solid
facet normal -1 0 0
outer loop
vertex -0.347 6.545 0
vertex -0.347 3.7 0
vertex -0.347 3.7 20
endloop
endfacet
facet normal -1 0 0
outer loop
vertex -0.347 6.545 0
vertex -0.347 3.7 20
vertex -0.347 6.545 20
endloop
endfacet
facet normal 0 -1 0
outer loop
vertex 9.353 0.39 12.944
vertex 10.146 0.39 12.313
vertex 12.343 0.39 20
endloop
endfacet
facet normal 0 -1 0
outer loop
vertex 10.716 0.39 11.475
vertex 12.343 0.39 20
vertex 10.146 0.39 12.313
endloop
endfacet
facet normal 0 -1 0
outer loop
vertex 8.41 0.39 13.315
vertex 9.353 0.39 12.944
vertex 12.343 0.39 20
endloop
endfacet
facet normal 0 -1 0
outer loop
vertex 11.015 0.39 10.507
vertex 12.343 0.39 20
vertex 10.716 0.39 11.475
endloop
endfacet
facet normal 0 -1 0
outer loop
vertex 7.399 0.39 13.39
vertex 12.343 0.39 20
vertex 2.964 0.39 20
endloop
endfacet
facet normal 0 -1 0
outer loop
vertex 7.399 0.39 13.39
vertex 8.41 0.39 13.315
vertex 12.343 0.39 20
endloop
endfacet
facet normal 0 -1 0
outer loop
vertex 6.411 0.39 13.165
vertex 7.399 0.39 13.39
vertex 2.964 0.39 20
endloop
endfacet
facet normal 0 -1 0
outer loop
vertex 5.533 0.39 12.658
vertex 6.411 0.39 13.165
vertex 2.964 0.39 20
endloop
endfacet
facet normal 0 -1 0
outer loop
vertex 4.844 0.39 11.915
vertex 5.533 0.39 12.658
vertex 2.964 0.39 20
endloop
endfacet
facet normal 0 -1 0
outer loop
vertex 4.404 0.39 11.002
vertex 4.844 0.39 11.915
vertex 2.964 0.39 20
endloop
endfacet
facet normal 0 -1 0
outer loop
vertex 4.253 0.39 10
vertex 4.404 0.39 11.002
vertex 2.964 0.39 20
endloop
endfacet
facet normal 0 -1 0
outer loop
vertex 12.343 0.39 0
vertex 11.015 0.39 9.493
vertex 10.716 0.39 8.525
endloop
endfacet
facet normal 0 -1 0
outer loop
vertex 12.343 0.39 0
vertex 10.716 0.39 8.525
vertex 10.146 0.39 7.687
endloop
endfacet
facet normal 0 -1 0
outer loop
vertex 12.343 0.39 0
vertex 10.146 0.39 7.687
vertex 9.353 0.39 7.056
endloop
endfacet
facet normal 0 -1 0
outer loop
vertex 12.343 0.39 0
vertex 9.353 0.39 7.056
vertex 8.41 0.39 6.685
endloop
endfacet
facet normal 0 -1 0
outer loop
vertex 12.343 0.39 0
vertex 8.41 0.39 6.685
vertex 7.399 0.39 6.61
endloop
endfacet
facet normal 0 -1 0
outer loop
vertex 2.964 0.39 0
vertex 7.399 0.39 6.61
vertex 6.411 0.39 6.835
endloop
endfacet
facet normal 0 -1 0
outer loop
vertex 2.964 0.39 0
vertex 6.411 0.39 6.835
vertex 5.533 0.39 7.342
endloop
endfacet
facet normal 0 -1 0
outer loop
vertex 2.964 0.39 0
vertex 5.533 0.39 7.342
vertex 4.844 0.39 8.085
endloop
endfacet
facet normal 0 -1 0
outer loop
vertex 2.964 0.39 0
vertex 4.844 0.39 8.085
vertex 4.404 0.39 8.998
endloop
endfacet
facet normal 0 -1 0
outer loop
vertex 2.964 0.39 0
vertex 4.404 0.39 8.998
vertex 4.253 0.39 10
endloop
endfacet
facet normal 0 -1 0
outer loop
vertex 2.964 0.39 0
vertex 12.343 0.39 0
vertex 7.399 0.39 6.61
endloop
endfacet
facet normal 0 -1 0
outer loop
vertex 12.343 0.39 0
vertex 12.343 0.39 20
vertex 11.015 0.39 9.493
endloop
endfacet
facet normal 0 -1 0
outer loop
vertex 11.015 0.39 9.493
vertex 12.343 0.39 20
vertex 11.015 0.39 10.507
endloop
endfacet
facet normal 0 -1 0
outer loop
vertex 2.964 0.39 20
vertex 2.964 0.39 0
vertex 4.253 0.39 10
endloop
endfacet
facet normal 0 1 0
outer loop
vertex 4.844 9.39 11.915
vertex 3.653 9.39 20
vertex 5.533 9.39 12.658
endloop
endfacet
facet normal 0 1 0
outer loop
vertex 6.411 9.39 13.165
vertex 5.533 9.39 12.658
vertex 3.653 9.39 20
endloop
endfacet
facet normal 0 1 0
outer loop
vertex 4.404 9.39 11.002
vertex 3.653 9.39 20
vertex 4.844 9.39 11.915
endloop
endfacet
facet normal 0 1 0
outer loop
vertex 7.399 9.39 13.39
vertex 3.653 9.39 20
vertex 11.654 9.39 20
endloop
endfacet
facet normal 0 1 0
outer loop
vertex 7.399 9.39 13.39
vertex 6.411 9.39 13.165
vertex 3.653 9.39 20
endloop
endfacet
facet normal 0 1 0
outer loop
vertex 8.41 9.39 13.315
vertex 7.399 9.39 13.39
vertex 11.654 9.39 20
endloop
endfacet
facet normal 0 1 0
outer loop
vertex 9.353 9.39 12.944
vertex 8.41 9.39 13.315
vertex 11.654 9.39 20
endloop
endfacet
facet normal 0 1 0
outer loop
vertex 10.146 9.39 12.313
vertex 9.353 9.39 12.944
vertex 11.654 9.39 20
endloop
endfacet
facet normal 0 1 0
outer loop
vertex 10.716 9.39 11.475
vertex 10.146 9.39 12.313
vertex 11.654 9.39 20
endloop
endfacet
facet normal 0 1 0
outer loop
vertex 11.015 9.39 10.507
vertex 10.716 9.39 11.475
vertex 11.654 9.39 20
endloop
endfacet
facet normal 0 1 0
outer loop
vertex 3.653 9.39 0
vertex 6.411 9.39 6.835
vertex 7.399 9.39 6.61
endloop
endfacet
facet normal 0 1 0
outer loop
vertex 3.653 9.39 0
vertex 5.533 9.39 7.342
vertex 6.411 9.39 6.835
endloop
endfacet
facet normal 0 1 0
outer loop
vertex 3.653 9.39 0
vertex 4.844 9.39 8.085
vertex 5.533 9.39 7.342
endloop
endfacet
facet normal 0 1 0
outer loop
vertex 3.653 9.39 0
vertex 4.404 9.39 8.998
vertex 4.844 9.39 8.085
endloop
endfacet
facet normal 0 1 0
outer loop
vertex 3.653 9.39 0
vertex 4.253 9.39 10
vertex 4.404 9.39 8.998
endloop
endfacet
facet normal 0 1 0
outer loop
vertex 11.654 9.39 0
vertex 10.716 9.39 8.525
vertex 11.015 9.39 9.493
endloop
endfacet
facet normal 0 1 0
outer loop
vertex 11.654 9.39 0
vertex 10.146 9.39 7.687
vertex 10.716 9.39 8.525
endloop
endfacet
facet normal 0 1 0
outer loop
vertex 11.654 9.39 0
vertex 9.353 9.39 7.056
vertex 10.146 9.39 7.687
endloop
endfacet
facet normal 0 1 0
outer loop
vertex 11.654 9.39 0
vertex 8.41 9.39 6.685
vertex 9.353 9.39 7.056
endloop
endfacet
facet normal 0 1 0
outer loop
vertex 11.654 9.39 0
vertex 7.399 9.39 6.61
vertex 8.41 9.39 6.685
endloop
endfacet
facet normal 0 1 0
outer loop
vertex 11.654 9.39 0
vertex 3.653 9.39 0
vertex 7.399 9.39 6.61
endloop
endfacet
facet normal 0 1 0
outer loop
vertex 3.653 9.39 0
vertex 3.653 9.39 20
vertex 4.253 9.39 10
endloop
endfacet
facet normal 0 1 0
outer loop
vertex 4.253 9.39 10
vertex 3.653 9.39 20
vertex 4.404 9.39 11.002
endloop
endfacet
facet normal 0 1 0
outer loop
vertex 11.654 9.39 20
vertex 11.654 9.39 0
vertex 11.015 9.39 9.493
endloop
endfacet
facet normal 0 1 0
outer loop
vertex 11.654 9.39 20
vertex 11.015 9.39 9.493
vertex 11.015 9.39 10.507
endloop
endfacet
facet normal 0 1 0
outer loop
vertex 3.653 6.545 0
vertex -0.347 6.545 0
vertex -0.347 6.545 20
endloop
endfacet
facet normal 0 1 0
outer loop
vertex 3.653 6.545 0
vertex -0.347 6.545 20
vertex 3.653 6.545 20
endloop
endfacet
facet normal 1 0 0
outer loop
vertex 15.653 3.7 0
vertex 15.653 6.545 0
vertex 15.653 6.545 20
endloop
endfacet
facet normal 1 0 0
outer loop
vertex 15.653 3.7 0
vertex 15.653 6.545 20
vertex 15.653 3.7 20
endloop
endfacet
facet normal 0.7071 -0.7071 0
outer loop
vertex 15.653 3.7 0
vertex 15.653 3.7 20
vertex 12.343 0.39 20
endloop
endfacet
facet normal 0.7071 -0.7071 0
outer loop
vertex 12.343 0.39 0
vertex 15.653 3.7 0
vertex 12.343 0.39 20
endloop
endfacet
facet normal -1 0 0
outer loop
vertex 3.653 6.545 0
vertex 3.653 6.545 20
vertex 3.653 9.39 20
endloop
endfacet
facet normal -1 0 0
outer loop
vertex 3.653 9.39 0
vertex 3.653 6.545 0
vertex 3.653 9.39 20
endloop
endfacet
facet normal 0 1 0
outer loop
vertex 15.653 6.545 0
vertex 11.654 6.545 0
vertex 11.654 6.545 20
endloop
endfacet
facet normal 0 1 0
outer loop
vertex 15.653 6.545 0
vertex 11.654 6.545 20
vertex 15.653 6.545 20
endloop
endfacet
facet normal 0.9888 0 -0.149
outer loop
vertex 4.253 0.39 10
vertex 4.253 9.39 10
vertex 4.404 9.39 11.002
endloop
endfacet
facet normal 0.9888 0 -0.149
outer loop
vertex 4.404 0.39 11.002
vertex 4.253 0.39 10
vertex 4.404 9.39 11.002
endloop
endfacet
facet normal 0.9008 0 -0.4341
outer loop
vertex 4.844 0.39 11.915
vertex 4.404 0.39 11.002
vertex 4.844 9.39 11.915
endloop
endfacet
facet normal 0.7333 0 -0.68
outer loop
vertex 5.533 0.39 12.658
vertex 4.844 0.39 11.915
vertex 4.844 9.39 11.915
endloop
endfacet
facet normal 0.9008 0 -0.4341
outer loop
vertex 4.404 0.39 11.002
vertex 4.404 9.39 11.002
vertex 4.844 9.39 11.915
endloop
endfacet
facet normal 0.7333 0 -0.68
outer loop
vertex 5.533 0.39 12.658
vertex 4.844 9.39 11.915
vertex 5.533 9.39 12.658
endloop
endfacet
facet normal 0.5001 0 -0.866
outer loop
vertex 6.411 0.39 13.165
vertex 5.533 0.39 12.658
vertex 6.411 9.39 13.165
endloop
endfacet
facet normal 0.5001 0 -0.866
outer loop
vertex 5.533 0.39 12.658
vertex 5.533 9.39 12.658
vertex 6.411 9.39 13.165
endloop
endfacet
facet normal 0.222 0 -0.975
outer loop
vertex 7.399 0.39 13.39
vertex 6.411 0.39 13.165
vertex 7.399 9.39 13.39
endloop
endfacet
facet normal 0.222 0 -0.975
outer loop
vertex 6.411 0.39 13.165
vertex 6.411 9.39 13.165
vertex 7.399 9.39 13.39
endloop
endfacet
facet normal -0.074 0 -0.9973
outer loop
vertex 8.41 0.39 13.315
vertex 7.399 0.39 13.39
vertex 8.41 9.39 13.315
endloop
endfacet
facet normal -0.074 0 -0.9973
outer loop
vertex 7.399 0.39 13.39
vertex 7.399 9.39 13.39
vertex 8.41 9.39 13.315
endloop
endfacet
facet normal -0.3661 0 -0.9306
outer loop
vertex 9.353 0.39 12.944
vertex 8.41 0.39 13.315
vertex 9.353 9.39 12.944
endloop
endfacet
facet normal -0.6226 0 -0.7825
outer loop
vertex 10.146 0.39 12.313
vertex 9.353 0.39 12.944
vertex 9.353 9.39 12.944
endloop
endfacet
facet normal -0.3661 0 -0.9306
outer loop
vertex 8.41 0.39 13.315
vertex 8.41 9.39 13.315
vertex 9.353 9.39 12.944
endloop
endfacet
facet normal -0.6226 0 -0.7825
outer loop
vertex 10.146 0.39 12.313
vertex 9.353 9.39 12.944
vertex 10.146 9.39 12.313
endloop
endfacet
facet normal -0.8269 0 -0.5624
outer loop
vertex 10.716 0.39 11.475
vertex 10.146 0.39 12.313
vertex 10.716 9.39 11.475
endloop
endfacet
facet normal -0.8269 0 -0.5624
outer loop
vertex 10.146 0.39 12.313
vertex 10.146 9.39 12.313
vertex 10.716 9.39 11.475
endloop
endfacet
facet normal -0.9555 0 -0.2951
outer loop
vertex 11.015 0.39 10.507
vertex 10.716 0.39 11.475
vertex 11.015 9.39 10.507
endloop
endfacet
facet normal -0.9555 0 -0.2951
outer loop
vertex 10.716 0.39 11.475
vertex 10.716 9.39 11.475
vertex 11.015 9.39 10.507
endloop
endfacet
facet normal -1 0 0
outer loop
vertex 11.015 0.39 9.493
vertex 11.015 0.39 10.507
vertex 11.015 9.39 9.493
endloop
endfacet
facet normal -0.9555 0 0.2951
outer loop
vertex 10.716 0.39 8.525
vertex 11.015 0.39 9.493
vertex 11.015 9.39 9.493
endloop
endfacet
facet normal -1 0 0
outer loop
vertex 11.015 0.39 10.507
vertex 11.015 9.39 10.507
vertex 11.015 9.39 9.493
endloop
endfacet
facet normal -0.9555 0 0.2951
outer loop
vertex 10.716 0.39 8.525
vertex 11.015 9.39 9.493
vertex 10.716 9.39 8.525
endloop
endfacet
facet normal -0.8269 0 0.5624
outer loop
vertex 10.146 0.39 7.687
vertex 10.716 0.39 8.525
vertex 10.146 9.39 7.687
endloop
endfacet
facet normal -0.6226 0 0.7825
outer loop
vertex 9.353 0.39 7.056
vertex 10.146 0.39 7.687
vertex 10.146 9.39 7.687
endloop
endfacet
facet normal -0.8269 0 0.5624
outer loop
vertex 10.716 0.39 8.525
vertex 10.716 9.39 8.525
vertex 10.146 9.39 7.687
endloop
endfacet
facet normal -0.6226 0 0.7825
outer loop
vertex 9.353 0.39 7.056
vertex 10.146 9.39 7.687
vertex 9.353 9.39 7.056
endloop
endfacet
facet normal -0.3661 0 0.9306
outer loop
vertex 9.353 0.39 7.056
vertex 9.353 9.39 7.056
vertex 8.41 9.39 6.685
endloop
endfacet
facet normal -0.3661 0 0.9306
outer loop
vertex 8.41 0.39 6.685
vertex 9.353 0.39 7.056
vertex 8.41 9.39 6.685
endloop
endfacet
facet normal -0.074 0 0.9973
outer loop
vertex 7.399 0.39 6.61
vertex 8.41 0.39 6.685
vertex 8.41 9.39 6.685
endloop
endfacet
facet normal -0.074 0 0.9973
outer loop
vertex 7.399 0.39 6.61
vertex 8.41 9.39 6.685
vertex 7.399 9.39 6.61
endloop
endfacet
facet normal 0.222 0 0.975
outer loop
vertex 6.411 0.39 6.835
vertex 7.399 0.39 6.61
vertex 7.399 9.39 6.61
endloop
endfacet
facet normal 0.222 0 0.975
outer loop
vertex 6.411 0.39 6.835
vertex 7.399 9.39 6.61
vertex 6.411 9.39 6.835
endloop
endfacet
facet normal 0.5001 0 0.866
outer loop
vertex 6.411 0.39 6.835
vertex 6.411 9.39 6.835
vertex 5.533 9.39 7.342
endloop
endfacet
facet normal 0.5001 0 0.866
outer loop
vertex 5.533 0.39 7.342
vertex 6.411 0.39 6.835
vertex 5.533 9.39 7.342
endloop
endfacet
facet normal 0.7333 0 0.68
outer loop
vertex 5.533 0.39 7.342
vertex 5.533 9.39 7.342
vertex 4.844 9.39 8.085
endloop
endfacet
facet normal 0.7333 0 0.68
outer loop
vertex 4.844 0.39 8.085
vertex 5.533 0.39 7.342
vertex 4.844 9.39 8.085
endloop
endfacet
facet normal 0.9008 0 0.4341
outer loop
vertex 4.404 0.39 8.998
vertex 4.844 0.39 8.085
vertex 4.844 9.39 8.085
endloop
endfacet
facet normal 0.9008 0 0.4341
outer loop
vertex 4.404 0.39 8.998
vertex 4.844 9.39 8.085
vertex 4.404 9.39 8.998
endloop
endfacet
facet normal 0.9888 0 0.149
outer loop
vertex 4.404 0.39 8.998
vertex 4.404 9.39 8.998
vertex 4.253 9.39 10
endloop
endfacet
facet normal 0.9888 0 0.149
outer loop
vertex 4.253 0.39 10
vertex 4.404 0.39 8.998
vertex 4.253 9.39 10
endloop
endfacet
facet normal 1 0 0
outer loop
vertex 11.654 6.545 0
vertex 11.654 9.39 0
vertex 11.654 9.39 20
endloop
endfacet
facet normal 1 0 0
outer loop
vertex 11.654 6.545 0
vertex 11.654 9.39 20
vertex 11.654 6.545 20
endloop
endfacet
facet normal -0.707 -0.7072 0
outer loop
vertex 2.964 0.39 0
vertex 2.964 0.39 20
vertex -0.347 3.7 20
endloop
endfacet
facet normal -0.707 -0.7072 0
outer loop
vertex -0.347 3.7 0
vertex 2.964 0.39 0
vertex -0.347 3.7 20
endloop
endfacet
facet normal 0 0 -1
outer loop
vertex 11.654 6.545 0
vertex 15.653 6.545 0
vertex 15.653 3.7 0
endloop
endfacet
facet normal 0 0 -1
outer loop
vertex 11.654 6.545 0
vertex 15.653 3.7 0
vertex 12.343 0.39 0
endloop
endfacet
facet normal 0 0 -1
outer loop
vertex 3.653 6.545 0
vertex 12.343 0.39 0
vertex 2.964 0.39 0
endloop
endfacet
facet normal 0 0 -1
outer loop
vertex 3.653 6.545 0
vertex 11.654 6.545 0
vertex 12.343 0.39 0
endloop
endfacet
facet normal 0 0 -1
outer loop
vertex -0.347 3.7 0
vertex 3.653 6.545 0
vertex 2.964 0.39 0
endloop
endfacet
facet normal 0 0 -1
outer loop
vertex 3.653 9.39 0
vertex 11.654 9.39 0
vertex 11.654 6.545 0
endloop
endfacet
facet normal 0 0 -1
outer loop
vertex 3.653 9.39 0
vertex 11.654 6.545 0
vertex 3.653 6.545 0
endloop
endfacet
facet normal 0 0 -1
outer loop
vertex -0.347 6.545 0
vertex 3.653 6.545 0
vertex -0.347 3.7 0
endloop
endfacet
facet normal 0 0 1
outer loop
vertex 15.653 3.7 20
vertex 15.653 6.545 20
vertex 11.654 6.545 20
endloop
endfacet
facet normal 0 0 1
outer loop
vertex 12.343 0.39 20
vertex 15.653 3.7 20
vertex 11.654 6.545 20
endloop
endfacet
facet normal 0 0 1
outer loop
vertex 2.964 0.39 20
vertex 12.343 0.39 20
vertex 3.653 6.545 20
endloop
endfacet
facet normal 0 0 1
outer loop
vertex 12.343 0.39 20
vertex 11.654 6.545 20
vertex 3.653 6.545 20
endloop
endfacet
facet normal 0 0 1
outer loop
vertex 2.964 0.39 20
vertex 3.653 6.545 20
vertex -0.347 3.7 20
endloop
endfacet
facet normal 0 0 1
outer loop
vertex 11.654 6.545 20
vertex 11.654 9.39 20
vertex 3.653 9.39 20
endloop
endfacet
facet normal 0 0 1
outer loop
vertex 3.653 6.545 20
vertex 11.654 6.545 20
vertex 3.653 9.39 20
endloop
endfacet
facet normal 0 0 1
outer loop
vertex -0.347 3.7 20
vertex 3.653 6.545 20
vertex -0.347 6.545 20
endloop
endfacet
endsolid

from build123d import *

# Parameters (mm, degrees)
EXTRUSION1_DEPTH = 20
HOLE2_D          = 6.8


with BuildPart() as part:
    # Sketch1 → Extrusion1 (new body)
    with BuildSketch(Plane.XY):
        Polygon((2.963546137, 0.389938146), (-0.346853863, 3.700338146), (-0.346853863, 6.545138146), (3.652646137, 6.545138146), (3.652646137, 9.389938146), (11.653646137, 9.389938146), (11.653646137, 6.545138146), (15.653146137, 6.545138146), (15.653146137, 3.700338146), (12.342746137, 0.389938146), align=None)
    extrude(amount=EXTRUSION1_DEPTH)

    # Hole2 (through all)
    with Locations(Plane.XZ.offset(-0.389938146)):
        with Locations((7.653146137, 10)):
            Hole(HOLE2_D / 2)


solid = part.part
